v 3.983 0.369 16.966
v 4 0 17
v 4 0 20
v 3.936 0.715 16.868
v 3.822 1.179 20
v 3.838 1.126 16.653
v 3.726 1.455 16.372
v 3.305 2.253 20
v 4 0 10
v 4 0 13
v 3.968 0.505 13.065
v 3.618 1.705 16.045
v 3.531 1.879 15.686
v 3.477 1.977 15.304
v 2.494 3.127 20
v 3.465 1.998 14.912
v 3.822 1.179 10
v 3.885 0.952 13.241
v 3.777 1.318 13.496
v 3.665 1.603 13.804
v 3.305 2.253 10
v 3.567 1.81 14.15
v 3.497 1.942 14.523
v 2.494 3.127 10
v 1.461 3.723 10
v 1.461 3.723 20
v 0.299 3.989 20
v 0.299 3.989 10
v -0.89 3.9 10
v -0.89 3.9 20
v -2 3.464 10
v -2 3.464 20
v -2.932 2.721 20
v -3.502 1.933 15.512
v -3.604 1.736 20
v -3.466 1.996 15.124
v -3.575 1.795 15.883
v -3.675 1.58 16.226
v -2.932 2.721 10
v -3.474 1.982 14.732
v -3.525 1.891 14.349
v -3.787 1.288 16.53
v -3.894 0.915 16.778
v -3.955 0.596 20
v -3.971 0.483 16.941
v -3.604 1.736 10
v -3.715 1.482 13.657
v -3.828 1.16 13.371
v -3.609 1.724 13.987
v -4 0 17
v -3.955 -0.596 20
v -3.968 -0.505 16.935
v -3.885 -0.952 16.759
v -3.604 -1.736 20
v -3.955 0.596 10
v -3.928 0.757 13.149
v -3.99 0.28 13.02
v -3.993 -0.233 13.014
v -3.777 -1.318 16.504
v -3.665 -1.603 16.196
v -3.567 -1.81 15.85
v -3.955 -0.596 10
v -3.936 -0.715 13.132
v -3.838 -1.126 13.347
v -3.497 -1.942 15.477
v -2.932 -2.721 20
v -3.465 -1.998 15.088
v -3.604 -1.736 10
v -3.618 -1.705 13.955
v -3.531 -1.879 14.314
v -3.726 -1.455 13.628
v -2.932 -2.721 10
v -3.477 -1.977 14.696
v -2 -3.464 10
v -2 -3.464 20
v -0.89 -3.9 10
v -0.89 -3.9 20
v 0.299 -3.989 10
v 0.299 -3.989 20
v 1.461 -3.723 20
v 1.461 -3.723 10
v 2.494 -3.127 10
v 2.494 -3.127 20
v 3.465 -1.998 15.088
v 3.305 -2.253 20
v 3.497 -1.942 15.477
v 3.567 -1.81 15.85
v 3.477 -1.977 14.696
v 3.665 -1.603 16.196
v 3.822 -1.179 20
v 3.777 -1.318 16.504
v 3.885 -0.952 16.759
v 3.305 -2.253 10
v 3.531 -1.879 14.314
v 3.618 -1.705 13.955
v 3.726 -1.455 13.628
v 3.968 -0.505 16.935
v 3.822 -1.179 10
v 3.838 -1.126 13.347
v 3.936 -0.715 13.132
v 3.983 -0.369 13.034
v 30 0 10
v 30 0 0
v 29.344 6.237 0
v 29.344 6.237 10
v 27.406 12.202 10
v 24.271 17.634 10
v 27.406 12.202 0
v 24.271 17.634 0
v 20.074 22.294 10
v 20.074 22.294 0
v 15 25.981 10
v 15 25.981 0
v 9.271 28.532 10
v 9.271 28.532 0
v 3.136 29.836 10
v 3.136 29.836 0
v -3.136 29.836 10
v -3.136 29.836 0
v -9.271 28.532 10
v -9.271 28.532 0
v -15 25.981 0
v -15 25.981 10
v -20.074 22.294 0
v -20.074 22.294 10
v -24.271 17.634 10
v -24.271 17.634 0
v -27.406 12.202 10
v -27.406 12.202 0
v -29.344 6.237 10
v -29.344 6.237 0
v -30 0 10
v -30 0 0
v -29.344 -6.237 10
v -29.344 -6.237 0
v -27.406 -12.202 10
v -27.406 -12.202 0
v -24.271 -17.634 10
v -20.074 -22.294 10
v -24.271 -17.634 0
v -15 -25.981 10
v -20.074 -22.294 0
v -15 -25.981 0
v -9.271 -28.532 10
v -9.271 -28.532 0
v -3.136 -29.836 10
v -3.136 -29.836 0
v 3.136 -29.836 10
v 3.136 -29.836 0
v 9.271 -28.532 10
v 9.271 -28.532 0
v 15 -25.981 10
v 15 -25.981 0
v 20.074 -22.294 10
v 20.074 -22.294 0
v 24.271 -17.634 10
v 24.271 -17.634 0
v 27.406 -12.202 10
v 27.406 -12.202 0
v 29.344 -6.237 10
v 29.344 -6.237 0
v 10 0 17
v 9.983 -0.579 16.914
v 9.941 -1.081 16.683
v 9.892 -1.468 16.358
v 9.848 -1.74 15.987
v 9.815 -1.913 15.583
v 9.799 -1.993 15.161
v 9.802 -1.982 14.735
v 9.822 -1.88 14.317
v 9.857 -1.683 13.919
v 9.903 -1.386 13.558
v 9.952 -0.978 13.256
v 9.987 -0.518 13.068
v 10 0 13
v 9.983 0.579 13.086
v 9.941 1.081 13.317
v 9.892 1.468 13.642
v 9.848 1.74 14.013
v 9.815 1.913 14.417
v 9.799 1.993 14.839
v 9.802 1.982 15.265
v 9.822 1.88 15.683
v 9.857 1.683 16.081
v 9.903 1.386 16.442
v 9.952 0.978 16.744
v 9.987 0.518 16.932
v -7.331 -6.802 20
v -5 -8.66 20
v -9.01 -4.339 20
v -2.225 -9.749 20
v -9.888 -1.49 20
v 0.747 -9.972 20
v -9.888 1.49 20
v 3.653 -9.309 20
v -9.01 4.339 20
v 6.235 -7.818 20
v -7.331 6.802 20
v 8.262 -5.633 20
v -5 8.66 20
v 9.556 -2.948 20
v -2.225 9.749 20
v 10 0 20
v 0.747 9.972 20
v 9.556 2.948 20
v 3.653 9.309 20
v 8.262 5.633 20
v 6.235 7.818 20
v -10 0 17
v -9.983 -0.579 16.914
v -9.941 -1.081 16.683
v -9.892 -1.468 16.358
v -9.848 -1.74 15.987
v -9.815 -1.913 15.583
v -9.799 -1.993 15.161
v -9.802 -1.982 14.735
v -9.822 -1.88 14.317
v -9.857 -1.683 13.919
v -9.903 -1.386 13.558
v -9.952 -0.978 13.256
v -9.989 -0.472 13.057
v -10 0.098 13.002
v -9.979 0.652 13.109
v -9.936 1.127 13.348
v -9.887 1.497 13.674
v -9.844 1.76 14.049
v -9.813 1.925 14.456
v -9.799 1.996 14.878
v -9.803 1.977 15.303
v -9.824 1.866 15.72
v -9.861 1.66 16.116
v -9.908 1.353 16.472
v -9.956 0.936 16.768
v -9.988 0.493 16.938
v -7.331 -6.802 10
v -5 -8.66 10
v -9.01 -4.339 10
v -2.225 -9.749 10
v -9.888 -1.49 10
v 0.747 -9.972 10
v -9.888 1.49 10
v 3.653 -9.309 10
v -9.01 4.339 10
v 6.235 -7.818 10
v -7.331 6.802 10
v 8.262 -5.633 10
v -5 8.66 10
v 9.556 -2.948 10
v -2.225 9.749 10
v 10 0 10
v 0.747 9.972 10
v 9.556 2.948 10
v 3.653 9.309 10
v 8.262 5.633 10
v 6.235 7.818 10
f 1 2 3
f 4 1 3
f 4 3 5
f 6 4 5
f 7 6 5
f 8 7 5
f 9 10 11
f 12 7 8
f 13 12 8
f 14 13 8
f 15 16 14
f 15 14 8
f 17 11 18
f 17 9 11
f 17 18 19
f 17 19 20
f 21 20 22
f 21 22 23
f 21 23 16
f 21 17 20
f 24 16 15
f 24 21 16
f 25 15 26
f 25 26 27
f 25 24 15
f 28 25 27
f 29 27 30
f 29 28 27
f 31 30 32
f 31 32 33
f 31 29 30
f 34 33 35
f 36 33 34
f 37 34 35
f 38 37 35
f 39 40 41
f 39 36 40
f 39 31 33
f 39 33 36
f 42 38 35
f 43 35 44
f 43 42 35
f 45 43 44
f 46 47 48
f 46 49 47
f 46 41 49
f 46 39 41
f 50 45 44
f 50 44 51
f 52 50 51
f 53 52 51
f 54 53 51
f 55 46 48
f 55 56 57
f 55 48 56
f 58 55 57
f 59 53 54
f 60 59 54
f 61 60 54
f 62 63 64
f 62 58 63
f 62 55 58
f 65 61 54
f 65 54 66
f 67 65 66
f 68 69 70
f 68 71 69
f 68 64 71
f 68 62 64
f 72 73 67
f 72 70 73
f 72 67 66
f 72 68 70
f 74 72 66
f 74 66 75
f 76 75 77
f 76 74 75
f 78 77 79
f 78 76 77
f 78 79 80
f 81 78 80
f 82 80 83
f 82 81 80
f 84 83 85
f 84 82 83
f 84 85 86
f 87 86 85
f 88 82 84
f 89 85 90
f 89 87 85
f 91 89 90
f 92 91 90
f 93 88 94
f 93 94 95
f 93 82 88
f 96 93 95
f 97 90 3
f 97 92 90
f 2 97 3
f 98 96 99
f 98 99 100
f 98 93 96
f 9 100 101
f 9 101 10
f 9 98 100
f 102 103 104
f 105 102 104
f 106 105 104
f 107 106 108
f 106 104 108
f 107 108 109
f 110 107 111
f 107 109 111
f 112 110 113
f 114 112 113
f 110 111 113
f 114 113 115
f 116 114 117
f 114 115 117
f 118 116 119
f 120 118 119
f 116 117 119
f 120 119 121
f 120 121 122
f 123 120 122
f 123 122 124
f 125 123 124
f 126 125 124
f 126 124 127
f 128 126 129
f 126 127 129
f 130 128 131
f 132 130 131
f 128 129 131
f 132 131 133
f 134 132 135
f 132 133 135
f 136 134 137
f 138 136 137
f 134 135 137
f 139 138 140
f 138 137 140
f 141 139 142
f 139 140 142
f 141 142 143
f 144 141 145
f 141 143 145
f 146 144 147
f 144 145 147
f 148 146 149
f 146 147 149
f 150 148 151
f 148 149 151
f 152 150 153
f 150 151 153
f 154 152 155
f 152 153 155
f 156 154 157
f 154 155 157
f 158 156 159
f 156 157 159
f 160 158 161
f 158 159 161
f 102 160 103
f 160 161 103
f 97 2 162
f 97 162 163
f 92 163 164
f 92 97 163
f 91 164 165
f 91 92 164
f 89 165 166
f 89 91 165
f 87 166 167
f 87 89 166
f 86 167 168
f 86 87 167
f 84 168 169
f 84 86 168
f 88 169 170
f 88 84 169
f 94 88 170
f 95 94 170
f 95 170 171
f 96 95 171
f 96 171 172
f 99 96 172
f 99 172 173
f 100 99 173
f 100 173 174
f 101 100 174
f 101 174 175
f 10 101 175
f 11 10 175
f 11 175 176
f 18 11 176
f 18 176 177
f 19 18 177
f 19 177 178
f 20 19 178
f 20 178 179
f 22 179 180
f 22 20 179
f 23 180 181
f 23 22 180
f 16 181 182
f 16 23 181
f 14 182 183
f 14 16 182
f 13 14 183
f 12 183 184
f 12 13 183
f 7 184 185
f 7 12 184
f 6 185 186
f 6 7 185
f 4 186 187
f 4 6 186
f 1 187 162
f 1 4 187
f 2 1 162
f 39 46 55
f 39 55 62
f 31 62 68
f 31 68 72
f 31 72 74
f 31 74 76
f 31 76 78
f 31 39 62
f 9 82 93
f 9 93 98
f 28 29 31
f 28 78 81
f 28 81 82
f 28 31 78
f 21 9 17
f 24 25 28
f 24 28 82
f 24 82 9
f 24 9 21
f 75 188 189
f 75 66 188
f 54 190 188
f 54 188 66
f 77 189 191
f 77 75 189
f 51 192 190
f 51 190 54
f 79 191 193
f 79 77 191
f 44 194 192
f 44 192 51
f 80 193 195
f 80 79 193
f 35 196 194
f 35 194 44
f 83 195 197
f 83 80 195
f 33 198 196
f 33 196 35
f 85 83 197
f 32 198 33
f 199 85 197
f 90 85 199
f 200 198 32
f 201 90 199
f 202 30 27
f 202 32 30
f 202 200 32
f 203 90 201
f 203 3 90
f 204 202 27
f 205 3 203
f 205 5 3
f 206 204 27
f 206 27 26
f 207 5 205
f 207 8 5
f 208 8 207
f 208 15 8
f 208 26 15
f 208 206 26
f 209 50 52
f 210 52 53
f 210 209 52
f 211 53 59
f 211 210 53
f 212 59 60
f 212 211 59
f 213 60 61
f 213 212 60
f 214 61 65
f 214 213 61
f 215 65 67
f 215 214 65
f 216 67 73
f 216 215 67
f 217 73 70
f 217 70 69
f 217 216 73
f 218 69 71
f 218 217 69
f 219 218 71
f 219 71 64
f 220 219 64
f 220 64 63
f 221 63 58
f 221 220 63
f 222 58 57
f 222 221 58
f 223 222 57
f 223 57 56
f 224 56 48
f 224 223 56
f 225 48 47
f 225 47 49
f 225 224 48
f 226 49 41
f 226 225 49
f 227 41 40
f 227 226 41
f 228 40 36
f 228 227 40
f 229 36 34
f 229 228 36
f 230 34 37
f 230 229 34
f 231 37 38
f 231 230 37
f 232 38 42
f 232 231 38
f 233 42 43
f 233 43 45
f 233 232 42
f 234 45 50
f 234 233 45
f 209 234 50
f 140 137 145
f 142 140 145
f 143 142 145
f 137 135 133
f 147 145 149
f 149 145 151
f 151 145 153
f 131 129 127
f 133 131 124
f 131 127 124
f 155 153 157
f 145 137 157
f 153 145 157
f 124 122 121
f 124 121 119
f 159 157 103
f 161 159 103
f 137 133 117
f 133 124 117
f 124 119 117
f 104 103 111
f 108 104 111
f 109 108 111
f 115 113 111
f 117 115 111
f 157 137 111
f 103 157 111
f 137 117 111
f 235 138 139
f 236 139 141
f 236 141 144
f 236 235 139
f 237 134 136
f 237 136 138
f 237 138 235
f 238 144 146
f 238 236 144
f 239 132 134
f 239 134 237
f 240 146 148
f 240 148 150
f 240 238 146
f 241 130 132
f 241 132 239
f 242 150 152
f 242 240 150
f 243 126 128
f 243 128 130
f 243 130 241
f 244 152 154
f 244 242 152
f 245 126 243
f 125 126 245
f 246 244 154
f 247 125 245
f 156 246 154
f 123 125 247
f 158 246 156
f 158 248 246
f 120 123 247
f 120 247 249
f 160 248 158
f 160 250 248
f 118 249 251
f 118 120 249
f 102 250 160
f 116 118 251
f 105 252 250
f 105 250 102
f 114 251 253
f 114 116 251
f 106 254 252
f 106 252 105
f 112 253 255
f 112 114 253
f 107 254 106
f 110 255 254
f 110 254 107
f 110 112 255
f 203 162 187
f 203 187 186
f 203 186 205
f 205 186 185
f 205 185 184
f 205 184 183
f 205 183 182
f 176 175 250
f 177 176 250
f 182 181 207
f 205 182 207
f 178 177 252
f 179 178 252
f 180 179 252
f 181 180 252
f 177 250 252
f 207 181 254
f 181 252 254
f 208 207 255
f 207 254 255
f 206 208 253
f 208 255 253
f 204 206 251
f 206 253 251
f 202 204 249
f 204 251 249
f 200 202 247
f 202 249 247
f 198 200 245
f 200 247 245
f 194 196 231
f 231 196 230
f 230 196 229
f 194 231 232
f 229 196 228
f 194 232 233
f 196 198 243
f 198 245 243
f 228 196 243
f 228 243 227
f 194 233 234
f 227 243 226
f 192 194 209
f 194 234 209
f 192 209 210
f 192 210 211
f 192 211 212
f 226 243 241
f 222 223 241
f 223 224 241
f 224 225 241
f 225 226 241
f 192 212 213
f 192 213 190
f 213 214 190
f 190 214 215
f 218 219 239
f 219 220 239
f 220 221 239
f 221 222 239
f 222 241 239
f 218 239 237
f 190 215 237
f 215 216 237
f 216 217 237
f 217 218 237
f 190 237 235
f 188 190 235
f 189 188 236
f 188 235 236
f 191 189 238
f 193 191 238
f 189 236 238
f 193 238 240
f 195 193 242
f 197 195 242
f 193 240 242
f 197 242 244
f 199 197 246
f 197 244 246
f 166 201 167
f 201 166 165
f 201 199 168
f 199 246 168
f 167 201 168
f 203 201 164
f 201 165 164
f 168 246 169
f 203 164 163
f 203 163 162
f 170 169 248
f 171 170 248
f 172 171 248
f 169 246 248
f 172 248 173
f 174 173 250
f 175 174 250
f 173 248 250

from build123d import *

# Parameters (mm, degrees)
SKETCH1_R               = 30
BOSS_EXTRUDE1_DEPTH     = 10
SKETCH2_R               = 10
SKETCH2_R_2             = 4
BOSS_EXTRUDE2_DEPTH     = 10
CUT_EXTRUDE1_DEPTH      = 10
CUT_EXTRUDE1_DEPTH_BACK = 10
SKETCH3_R               = 2


with BuildPart() as part:
    # Sketch1 → Boss-Extrude1 (new body)
    with BuildSketch(Plane.XY):
        Circle(SKETCH1_R)
    extrude(amount=BOSS_EXTRUDE1_DEPTH)

    # Sketch2 → Boss-Extrude2 (add)
    with BuildSketch(Plane.XY.offset(10)):
        Circle(SKETCH2_R)
        Circle(SKETCH2_R_2, mode=Mode.SUBTRACT)
    extrude(amount=BOSS_EXTRUDE2_DEPTH)

    # Sketch3 → Cut-Extrude1 (cut, two sides: drawn at the far end of the back side and taken through both)
    with BuildSketch(Plane(origin=(0, 0, 0), x_dir=(0, 0, -1), z_dir=(1, 0, 0)).offset(-CUT_EXTRUDE1_DEPTH_BACK)):
        with Locations((-15, 0)):
            Circle(SKETCH3_R)
    extrude(amount=CUT_EXTRUDE1_DEPTH + CUT_EXTRUDE1_DEPTH_BACK, mode=Mode.SUBTRACT)


solid = part.part
